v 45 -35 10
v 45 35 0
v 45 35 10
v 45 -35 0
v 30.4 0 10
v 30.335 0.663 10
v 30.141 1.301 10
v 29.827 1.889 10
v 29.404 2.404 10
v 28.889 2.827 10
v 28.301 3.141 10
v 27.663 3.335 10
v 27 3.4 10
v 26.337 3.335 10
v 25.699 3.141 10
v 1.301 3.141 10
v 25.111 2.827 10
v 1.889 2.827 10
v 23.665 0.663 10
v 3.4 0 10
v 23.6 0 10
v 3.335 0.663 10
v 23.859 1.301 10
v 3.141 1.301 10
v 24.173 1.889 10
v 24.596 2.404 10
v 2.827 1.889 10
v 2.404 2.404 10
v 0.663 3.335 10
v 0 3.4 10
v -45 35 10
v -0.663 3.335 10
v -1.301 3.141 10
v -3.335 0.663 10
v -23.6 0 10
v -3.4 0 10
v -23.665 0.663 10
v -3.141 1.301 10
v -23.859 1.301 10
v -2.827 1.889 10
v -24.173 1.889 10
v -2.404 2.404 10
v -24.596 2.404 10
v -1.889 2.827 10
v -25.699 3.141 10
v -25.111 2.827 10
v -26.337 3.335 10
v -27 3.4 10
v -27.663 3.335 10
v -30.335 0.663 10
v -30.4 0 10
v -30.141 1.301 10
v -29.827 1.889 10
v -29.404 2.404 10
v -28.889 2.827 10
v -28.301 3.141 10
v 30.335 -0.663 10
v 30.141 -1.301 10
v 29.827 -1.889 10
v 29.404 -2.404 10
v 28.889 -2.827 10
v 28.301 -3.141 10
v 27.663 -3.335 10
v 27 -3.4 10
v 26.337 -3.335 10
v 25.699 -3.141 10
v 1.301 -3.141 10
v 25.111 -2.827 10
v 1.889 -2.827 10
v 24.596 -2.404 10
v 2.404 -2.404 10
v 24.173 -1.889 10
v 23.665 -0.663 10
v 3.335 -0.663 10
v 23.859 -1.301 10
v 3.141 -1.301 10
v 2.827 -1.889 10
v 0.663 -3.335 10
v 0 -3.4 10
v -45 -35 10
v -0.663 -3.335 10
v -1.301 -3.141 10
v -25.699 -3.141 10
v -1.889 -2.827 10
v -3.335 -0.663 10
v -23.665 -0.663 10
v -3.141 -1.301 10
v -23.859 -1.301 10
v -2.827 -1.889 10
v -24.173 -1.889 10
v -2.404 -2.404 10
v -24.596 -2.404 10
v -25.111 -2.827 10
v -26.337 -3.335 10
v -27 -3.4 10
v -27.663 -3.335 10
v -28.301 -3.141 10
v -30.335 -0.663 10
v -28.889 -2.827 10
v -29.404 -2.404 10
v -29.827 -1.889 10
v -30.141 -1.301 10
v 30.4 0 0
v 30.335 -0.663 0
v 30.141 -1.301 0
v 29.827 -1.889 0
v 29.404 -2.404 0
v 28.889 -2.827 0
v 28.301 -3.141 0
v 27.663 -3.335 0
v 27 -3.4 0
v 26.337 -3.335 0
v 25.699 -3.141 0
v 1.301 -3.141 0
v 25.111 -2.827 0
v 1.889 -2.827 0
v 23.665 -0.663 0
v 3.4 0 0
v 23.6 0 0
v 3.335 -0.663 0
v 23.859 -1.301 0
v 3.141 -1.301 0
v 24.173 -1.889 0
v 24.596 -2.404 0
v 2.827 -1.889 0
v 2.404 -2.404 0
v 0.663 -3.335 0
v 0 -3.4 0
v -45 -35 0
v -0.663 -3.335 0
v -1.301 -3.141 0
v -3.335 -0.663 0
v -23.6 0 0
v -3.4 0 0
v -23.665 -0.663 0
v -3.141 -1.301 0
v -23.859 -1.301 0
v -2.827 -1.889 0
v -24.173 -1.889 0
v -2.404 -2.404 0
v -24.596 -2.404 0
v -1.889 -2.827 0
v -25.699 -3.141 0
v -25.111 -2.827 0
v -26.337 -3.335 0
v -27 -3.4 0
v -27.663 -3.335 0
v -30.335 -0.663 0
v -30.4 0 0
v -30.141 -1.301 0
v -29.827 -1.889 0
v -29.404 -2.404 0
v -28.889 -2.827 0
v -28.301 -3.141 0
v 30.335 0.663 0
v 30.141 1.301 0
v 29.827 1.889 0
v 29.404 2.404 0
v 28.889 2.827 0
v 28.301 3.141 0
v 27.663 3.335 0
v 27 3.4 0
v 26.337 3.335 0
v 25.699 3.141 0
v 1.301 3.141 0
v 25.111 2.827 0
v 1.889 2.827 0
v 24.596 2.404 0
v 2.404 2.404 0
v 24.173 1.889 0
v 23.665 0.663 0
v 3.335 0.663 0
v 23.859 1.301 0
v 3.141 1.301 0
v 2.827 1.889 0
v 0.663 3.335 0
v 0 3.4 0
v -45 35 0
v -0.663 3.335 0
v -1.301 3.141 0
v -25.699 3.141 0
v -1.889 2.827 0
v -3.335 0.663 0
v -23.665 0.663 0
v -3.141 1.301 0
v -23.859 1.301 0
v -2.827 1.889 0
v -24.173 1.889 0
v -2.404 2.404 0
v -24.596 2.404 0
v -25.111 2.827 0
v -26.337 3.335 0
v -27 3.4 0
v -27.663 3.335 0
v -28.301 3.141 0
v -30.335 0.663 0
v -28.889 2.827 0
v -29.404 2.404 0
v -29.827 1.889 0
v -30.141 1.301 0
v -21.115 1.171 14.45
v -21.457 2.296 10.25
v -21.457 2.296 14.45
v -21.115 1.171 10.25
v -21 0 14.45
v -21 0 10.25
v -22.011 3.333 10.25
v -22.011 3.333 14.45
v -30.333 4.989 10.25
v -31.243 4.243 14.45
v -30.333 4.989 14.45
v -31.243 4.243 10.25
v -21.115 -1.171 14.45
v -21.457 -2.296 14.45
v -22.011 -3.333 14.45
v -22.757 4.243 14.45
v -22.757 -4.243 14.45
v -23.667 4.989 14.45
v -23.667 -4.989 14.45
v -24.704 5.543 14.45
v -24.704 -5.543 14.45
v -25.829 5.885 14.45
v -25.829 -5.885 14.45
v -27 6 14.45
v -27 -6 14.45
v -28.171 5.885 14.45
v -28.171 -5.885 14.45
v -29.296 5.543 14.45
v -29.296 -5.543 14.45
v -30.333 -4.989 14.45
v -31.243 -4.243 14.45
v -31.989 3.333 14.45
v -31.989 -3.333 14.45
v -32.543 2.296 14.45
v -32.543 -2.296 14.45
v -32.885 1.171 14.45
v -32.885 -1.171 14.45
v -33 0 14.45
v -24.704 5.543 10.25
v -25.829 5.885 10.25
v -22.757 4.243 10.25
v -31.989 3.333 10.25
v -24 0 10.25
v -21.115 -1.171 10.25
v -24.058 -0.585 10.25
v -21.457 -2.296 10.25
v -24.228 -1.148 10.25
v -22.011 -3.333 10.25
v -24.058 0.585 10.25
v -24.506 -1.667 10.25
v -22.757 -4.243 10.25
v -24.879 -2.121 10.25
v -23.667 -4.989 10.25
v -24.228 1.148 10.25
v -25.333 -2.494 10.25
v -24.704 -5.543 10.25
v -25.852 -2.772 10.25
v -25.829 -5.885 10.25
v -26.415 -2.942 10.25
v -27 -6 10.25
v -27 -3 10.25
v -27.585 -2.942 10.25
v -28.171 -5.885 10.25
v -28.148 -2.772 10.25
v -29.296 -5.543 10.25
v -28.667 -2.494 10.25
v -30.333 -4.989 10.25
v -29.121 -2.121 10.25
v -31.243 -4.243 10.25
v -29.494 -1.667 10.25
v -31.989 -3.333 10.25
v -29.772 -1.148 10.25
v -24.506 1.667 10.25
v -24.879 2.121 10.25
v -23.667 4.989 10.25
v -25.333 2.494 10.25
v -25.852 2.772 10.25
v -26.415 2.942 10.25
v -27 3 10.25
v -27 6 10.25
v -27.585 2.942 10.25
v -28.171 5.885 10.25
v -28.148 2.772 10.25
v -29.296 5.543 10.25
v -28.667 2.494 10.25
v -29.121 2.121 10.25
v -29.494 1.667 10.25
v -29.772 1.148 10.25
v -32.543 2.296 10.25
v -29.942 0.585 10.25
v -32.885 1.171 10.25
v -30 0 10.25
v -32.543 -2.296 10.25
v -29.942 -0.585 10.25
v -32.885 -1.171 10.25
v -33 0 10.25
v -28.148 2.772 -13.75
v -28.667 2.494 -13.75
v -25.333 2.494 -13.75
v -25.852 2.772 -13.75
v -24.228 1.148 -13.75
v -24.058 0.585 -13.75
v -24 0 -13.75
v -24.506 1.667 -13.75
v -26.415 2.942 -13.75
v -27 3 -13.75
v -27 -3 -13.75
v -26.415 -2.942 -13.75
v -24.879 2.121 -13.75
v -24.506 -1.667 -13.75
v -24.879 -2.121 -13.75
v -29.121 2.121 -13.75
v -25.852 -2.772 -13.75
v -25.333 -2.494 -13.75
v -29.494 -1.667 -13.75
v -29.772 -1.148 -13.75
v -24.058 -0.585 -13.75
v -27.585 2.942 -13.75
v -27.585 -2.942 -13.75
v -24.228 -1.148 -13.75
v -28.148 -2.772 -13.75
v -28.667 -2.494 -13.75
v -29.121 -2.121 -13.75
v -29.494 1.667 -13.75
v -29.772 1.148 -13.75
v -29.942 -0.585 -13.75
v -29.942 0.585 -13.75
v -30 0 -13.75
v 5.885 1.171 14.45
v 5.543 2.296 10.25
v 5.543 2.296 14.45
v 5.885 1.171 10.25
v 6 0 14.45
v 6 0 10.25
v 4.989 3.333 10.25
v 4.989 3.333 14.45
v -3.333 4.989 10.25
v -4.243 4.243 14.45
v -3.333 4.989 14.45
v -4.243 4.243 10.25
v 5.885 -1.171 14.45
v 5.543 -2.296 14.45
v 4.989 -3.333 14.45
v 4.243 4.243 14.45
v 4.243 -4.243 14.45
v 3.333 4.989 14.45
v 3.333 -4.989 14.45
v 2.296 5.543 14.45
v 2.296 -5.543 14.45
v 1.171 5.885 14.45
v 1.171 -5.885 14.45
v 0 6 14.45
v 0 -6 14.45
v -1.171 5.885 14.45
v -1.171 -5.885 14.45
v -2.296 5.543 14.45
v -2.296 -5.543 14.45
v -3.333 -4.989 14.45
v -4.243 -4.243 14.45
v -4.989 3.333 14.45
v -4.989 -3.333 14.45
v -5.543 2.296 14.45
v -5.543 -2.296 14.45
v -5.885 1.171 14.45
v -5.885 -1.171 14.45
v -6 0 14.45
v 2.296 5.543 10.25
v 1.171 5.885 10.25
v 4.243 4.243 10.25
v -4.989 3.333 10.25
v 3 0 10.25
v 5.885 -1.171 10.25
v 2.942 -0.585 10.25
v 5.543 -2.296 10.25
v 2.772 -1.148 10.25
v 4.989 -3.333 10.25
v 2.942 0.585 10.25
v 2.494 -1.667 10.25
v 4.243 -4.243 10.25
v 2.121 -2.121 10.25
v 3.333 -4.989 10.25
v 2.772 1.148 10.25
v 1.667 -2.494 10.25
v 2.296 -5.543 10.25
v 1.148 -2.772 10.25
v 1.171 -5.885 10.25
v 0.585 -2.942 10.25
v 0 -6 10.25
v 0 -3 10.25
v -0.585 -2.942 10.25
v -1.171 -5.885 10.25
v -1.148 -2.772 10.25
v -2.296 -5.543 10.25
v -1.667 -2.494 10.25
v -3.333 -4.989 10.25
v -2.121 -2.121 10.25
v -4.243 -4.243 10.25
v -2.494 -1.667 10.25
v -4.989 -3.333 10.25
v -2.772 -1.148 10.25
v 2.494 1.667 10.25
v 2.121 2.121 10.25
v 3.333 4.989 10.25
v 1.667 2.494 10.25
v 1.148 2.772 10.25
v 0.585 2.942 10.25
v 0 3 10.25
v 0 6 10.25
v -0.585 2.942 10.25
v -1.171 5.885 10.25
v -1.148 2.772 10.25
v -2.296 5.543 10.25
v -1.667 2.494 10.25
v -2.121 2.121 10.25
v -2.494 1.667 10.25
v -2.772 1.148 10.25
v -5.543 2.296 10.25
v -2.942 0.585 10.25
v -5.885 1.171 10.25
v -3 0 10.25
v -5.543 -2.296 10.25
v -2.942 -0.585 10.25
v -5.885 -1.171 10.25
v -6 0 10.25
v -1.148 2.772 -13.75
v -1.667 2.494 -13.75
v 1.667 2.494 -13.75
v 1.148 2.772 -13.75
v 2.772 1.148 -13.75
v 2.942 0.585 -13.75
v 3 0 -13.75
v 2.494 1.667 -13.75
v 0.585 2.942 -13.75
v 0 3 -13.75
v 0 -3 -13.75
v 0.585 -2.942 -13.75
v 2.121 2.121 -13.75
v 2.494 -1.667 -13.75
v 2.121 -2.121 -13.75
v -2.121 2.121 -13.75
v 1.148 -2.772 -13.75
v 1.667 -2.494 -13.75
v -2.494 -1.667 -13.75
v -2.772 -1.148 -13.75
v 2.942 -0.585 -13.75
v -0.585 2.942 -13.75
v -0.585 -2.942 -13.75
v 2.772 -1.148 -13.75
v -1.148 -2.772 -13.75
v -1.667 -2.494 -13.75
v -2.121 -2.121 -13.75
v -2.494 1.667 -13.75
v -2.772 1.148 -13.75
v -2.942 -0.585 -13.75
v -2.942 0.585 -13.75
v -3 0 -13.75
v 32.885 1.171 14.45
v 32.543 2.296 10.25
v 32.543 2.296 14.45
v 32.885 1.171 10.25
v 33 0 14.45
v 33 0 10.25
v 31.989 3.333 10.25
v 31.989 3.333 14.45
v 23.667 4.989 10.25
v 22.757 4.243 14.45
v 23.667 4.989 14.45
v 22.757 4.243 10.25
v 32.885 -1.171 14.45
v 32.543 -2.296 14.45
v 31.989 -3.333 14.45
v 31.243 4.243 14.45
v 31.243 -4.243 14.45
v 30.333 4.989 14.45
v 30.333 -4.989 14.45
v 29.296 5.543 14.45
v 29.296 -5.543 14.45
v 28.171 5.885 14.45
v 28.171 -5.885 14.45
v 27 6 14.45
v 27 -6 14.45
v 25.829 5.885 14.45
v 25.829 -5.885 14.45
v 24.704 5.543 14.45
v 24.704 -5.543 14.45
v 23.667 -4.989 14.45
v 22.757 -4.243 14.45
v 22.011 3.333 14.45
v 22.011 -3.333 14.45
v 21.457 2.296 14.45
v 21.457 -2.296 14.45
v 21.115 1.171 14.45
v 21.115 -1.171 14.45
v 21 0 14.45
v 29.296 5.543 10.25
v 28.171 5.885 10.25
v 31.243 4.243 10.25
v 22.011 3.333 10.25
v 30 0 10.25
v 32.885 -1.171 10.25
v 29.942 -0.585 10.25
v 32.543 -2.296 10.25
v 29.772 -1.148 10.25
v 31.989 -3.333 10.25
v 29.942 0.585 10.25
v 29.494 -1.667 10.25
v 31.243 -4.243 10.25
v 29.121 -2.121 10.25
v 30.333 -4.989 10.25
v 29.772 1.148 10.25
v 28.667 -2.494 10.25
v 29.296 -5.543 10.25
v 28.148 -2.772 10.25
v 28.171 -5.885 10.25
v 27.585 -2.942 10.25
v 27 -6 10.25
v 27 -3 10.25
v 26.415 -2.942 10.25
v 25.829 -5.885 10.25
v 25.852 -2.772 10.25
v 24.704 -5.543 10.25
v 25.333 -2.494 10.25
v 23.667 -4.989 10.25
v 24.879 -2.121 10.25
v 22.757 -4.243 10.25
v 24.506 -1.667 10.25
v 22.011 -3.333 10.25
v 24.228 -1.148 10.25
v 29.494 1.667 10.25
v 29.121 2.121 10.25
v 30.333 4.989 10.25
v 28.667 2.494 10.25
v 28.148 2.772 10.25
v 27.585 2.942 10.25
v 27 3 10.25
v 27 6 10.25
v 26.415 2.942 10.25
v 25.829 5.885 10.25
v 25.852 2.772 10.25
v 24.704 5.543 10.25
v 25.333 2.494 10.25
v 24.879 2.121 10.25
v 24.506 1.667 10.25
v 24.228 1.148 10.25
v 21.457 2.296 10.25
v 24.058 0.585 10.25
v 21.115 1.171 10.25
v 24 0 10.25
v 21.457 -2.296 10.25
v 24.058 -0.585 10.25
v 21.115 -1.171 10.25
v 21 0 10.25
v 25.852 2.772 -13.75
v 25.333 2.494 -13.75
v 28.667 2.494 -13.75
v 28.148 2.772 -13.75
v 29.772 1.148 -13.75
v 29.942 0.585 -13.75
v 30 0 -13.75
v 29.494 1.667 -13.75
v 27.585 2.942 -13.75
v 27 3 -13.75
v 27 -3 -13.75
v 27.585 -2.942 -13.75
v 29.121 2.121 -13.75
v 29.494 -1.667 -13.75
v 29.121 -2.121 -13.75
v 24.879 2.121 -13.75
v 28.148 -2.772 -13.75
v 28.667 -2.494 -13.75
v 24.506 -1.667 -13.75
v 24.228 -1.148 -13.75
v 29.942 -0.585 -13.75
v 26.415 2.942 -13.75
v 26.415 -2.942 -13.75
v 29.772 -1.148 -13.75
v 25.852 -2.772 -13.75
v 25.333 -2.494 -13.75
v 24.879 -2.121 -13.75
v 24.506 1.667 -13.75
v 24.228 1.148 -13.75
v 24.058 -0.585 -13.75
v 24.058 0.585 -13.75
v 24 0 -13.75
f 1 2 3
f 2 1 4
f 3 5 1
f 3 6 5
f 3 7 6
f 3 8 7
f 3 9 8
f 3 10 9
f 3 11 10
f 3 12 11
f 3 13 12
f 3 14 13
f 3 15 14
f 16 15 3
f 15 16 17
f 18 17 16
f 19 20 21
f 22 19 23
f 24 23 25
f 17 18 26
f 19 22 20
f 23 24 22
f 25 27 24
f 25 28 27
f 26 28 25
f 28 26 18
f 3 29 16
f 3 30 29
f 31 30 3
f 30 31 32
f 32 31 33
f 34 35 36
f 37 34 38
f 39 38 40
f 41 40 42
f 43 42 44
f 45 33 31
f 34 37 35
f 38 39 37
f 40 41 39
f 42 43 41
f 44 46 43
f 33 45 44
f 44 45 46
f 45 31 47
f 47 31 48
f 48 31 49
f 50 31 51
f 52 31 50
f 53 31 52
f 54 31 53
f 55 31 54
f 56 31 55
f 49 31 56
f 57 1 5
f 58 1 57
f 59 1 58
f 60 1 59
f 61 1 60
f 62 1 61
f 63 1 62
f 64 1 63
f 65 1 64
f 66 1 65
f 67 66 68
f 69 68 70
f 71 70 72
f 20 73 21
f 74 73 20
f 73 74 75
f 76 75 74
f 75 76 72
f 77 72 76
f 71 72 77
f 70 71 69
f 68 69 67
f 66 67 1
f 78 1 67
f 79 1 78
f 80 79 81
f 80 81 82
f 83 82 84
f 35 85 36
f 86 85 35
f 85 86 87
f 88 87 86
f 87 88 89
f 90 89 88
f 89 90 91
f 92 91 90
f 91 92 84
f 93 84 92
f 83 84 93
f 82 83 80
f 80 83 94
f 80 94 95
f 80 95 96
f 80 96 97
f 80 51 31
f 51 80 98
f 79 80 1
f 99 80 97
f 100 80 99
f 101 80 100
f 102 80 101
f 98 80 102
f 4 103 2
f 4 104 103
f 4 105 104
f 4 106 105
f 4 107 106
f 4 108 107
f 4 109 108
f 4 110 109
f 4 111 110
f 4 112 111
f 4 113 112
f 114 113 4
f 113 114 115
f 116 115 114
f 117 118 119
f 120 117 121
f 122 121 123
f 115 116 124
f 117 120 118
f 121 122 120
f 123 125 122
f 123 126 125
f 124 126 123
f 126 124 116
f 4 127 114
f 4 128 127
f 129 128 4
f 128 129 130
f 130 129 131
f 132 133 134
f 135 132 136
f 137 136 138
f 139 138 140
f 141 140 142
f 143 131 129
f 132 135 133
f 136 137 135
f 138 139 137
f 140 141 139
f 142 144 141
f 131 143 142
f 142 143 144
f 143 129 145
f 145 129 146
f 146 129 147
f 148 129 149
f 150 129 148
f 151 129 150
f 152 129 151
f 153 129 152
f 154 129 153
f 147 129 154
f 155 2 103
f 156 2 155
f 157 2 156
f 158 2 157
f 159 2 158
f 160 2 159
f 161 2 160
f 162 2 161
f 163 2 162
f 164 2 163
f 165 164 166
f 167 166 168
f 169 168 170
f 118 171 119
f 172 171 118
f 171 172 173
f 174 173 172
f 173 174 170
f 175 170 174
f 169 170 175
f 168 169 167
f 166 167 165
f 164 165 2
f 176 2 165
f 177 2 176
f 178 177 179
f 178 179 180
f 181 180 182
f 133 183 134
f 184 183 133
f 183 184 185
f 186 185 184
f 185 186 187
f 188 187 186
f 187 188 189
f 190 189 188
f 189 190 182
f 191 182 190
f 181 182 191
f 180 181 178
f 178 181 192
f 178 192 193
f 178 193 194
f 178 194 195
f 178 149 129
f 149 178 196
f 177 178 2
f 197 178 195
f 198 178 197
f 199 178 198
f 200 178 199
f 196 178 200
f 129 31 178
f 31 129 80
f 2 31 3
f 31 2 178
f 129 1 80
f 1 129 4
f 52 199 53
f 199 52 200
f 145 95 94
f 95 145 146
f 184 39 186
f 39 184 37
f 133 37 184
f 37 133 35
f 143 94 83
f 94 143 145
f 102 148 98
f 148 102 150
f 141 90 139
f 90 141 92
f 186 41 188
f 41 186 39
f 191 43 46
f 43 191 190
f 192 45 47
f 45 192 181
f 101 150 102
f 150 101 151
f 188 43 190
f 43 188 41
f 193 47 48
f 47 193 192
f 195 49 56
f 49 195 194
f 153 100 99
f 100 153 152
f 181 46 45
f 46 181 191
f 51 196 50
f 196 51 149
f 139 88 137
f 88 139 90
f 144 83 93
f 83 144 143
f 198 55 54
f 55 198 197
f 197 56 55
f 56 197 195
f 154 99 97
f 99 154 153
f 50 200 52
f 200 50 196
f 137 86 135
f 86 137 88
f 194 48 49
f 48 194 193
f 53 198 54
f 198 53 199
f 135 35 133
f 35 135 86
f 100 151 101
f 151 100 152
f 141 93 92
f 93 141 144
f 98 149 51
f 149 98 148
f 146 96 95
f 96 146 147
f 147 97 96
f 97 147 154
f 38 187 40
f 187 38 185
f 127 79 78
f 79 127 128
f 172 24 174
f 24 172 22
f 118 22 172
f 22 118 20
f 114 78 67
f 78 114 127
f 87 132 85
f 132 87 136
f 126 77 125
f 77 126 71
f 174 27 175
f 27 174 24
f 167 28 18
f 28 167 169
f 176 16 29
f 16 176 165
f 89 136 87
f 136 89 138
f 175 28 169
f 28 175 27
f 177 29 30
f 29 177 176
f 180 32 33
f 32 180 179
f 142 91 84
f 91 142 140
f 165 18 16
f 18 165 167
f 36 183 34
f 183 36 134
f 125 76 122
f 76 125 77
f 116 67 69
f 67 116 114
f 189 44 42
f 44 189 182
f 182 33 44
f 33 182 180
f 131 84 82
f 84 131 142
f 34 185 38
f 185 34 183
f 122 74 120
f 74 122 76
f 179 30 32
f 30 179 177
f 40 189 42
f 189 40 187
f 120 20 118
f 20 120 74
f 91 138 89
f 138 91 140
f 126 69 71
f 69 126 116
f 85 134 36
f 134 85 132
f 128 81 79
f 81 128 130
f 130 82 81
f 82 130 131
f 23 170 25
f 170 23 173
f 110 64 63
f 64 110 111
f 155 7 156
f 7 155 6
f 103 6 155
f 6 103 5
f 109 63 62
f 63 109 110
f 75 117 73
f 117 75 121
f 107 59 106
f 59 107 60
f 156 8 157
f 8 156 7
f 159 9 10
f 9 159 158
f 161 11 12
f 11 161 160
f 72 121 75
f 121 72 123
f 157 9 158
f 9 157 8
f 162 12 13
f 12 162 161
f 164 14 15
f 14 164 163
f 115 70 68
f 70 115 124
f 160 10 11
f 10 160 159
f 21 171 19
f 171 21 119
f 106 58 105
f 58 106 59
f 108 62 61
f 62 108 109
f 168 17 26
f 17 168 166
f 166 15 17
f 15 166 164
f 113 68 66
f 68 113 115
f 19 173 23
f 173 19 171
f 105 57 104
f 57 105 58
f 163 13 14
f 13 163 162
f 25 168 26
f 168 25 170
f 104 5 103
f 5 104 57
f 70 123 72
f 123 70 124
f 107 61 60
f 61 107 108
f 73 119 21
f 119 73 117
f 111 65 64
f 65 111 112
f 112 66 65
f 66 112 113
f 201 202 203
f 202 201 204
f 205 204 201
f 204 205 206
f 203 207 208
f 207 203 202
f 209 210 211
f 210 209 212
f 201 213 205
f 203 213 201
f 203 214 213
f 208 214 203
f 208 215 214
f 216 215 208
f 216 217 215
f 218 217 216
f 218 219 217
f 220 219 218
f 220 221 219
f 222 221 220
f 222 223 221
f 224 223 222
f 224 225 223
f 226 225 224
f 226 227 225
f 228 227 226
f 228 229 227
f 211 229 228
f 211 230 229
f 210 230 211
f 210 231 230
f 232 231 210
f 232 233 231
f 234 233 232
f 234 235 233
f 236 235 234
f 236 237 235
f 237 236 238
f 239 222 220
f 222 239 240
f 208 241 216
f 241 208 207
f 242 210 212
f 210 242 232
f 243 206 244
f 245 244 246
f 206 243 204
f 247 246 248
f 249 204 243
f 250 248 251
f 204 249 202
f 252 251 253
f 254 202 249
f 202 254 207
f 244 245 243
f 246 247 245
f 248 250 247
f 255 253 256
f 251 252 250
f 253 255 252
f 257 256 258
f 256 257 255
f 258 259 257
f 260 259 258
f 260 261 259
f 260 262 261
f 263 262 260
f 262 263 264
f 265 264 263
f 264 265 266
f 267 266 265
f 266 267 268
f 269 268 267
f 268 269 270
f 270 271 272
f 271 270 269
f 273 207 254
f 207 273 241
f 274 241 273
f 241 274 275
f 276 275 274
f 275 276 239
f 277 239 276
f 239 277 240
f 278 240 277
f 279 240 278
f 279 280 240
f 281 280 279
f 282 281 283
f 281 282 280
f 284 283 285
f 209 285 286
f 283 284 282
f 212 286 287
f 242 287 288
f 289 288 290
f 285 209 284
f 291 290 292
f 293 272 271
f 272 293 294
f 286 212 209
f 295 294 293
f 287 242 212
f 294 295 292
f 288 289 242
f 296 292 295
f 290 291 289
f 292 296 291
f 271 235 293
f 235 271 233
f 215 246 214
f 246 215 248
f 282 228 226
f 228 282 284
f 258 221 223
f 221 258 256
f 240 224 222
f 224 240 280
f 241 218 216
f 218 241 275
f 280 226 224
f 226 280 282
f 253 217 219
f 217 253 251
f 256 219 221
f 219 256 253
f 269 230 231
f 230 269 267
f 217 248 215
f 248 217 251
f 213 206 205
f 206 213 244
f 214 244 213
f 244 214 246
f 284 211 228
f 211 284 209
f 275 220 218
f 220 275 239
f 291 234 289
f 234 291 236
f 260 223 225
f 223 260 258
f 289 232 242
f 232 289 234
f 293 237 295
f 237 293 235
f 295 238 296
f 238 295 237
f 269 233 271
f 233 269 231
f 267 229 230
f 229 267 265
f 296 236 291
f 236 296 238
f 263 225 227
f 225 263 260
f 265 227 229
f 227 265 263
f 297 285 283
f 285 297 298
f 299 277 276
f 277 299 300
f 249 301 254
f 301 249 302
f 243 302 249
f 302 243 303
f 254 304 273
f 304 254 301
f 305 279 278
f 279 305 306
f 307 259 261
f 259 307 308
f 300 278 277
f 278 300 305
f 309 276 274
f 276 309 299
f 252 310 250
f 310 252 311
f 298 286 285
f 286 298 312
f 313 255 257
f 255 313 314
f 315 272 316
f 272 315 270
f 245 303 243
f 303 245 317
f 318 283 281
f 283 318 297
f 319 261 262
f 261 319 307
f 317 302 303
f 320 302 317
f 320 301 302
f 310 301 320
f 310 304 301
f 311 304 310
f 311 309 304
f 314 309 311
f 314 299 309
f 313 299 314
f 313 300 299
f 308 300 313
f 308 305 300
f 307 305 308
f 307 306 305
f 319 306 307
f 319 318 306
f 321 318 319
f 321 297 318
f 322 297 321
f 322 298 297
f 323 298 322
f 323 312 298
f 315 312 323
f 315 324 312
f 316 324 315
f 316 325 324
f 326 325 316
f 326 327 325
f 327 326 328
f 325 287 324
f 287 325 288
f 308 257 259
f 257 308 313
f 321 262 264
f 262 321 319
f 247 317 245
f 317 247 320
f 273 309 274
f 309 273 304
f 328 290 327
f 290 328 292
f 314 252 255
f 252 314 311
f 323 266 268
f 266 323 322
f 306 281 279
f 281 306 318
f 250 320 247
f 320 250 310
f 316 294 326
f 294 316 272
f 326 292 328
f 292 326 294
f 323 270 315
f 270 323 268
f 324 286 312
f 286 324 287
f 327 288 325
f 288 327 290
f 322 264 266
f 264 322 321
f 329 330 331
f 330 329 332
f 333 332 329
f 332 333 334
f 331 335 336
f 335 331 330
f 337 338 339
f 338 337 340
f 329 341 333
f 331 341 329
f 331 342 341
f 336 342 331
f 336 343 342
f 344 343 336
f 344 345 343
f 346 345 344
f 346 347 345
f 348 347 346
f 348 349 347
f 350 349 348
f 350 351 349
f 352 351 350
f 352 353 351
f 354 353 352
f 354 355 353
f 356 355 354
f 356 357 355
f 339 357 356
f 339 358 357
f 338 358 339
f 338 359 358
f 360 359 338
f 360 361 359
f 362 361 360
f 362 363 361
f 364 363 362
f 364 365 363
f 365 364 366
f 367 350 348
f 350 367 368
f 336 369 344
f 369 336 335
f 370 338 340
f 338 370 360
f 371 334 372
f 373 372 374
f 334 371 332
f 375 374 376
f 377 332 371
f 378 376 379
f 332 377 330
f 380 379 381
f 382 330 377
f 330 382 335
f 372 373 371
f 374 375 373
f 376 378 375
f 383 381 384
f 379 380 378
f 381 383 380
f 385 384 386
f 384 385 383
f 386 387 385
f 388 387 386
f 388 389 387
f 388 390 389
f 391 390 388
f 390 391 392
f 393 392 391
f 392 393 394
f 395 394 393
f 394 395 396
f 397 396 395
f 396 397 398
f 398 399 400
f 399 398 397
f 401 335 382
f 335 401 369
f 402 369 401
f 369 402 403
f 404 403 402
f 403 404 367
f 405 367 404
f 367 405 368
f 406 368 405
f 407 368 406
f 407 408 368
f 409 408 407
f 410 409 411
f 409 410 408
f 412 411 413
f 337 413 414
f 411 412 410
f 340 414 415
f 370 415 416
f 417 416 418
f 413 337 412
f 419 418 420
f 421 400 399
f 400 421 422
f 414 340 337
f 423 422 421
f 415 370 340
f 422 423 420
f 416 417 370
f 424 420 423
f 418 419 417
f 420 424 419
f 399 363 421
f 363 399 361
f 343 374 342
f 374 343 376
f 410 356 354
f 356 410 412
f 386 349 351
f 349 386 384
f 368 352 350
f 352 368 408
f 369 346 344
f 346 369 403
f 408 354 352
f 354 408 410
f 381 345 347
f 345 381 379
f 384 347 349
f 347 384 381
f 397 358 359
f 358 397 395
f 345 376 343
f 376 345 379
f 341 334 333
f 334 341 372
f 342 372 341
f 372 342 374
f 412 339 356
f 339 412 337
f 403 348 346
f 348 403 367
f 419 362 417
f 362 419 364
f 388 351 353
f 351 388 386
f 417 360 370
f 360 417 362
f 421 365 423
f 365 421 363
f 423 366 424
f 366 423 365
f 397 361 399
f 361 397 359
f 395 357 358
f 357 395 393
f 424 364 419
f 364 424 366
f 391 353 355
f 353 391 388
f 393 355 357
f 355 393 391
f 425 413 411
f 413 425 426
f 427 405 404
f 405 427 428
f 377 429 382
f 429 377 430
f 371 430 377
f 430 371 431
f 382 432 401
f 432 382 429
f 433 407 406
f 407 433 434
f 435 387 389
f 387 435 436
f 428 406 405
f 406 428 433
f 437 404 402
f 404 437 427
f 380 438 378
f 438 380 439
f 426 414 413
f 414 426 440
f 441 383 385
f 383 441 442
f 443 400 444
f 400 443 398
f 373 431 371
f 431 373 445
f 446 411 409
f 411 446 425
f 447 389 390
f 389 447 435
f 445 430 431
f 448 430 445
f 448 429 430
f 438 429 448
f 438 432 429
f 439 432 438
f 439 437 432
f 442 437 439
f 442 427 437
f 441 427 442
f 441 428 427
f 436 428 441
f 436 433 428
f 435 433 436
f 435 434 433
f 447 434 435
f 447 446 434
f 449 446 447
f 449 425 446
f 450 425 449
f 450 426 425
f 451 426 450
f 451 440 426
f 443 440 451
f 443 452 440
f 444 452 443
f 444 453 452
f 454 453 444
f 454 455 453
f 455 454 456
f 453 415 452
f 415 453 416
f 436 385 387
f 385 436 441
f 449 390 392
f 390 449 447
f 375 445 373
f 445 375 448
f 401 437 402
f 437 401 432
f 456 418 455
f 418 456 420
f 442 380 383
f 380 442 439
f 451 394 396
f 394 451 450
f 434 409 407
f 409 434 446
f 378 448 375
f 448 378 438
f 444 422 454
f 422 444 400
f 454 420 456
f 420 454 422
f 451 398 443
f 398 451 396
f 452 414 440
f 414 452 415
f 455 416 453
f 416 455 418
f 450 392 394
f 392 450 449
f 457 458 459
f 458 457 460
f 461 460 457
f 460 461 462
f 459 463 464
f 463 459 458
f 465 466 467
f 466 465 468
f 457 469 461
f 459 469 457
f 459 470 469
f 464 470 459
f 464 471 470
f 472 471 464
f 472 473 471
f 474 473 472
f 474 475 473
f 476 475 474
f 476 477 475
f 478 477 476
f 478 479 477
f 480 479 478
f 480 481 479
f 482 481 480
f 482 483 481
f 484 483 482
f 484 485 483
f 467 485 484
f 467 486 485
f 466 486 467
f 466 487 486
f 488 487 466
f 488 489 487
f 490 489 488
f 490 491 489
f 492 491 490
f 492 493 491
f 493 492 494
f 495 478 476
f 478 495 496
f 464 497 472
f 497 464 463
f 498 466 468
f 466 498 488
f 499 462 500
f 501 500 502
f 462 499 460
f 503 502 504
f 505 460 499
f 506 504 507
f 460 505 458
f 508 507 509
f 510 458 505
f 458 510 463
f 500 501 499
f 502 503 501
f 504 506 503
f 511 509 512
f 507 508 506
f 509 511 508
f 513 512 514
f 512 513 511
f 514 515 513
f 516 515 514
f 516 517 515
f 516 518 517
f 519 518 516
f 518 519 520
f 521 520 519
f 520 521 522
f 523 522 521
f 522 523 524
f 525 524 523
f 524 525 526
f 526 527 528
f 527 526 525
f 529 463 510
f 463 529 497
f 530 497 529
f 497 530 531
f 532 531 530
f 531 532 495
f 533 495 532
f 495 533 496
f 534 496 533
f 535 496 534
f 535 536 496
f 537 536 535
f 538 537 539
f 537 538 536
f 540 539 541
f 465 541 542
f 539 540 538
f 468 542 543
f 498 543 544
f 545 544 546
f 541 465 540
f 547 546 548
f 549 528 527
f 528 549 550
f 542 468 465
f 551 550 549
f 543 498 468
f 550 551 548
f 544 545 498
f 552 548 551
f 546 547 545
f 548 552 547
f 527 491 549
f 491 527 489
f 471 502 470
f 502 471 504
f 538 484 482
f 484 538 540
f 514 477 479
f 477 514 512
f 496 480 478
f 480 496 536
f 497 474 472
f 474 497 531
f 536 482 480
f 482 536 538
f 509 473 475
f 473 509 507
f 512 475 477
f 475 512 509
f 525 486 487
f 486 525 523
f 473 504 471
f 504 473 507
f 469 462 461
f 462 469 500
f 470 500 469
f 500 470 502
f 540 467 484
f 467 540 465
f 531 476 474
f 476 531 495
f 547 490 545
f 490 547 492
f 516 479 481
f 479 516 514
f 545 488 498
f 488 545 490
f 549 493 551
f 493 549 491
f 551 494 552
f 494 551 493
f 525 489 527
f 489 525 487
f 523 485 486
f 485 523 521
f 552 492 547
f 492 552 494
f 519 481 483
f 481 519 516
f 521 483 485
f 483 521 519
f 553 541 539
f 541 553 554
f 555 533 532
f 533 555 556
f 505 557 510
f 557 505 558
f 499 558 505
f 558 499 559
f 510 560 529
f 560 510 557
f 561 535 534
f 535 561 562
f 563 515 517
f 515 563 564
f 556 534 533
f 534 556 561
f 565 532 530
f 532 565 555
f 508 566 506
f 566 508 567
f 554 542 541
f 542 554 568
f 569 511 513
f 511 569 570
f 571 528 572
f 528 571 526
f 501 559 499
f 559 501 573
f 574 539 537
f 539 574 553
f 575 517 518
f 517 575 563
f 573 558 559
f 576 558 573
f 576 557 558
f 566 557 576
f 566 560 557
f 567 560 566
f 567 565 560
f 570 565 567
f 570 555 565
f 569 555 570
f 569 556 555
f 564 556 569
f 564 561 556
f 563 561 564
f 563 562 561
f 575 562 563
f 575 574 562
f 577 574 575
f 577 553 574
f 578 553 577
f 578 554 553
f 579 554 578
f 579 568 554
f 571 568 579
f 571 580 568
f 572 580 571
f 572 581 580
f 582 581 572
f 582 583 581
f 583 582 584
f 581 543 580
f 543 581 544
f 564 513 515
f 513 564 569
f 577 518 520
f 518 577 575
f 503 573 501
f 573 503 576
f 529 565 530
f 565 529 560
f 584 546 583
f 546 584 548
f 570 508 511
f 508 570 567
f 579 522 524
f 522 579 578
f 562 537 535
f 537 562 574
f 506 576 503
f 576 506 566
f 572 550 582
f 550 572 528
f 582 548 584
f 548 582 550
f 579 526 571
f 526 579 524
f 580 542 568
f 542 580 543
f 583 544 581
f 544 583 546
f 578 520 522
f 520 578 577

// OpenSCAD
$fn = 32;

// ------------------------------------------------------------------------
// Bolted plate: 90 x 70 x 10 mm plate, 3 fasteners
// Every part is its own module, assembly() places them once.
// ------------------------------------------------------------------------

// --- part 1 ---
module plate() {
  difference() {
    translate([-45, -35, 0]) cube([90, 70, 10]);
    translate([-27, 0, -1]) cylinder(h = 12, d = 6.8);
    translate([0, 0, -1]) cylinder(h = 12, d = 6.8);
    translate([27, 0, -1]) cylinder(h = 12, d = 6.8);
  }
}

// --- part 2 ---
module bolt1() {
  cylinder(h = 4.2, d = 12);
  translate([0, 0, -24]) cylinder(h = 24, d = 6);
}

// --- part 3 ---
module bolt2() {
  cylinder(h = 4.2, d = 12);
  translate([0, 0, -24]) cylinder(h = 24, d = 6);
}

// --- part 4 ---
module bolt3() {
  cylinder(h = 4.2, d = 12);
  translate([0, 0, -24]) cylinder(h = 24, d = 6);
}

// --- assembly ---
module assembly() {
  translate([0, 0, 0]) rotate([0, 0, 0]) plate();
  translate([-27, 0, 10.25]) rotate([0, 0, 0]) bolt1();
  translate([0, 0, 10.25]) rotate([0, 0, 0]) bolt2();
  translate([27, 0, 10.25]) rotate([0, 0, 0]) bolt3();
}

assembly();
